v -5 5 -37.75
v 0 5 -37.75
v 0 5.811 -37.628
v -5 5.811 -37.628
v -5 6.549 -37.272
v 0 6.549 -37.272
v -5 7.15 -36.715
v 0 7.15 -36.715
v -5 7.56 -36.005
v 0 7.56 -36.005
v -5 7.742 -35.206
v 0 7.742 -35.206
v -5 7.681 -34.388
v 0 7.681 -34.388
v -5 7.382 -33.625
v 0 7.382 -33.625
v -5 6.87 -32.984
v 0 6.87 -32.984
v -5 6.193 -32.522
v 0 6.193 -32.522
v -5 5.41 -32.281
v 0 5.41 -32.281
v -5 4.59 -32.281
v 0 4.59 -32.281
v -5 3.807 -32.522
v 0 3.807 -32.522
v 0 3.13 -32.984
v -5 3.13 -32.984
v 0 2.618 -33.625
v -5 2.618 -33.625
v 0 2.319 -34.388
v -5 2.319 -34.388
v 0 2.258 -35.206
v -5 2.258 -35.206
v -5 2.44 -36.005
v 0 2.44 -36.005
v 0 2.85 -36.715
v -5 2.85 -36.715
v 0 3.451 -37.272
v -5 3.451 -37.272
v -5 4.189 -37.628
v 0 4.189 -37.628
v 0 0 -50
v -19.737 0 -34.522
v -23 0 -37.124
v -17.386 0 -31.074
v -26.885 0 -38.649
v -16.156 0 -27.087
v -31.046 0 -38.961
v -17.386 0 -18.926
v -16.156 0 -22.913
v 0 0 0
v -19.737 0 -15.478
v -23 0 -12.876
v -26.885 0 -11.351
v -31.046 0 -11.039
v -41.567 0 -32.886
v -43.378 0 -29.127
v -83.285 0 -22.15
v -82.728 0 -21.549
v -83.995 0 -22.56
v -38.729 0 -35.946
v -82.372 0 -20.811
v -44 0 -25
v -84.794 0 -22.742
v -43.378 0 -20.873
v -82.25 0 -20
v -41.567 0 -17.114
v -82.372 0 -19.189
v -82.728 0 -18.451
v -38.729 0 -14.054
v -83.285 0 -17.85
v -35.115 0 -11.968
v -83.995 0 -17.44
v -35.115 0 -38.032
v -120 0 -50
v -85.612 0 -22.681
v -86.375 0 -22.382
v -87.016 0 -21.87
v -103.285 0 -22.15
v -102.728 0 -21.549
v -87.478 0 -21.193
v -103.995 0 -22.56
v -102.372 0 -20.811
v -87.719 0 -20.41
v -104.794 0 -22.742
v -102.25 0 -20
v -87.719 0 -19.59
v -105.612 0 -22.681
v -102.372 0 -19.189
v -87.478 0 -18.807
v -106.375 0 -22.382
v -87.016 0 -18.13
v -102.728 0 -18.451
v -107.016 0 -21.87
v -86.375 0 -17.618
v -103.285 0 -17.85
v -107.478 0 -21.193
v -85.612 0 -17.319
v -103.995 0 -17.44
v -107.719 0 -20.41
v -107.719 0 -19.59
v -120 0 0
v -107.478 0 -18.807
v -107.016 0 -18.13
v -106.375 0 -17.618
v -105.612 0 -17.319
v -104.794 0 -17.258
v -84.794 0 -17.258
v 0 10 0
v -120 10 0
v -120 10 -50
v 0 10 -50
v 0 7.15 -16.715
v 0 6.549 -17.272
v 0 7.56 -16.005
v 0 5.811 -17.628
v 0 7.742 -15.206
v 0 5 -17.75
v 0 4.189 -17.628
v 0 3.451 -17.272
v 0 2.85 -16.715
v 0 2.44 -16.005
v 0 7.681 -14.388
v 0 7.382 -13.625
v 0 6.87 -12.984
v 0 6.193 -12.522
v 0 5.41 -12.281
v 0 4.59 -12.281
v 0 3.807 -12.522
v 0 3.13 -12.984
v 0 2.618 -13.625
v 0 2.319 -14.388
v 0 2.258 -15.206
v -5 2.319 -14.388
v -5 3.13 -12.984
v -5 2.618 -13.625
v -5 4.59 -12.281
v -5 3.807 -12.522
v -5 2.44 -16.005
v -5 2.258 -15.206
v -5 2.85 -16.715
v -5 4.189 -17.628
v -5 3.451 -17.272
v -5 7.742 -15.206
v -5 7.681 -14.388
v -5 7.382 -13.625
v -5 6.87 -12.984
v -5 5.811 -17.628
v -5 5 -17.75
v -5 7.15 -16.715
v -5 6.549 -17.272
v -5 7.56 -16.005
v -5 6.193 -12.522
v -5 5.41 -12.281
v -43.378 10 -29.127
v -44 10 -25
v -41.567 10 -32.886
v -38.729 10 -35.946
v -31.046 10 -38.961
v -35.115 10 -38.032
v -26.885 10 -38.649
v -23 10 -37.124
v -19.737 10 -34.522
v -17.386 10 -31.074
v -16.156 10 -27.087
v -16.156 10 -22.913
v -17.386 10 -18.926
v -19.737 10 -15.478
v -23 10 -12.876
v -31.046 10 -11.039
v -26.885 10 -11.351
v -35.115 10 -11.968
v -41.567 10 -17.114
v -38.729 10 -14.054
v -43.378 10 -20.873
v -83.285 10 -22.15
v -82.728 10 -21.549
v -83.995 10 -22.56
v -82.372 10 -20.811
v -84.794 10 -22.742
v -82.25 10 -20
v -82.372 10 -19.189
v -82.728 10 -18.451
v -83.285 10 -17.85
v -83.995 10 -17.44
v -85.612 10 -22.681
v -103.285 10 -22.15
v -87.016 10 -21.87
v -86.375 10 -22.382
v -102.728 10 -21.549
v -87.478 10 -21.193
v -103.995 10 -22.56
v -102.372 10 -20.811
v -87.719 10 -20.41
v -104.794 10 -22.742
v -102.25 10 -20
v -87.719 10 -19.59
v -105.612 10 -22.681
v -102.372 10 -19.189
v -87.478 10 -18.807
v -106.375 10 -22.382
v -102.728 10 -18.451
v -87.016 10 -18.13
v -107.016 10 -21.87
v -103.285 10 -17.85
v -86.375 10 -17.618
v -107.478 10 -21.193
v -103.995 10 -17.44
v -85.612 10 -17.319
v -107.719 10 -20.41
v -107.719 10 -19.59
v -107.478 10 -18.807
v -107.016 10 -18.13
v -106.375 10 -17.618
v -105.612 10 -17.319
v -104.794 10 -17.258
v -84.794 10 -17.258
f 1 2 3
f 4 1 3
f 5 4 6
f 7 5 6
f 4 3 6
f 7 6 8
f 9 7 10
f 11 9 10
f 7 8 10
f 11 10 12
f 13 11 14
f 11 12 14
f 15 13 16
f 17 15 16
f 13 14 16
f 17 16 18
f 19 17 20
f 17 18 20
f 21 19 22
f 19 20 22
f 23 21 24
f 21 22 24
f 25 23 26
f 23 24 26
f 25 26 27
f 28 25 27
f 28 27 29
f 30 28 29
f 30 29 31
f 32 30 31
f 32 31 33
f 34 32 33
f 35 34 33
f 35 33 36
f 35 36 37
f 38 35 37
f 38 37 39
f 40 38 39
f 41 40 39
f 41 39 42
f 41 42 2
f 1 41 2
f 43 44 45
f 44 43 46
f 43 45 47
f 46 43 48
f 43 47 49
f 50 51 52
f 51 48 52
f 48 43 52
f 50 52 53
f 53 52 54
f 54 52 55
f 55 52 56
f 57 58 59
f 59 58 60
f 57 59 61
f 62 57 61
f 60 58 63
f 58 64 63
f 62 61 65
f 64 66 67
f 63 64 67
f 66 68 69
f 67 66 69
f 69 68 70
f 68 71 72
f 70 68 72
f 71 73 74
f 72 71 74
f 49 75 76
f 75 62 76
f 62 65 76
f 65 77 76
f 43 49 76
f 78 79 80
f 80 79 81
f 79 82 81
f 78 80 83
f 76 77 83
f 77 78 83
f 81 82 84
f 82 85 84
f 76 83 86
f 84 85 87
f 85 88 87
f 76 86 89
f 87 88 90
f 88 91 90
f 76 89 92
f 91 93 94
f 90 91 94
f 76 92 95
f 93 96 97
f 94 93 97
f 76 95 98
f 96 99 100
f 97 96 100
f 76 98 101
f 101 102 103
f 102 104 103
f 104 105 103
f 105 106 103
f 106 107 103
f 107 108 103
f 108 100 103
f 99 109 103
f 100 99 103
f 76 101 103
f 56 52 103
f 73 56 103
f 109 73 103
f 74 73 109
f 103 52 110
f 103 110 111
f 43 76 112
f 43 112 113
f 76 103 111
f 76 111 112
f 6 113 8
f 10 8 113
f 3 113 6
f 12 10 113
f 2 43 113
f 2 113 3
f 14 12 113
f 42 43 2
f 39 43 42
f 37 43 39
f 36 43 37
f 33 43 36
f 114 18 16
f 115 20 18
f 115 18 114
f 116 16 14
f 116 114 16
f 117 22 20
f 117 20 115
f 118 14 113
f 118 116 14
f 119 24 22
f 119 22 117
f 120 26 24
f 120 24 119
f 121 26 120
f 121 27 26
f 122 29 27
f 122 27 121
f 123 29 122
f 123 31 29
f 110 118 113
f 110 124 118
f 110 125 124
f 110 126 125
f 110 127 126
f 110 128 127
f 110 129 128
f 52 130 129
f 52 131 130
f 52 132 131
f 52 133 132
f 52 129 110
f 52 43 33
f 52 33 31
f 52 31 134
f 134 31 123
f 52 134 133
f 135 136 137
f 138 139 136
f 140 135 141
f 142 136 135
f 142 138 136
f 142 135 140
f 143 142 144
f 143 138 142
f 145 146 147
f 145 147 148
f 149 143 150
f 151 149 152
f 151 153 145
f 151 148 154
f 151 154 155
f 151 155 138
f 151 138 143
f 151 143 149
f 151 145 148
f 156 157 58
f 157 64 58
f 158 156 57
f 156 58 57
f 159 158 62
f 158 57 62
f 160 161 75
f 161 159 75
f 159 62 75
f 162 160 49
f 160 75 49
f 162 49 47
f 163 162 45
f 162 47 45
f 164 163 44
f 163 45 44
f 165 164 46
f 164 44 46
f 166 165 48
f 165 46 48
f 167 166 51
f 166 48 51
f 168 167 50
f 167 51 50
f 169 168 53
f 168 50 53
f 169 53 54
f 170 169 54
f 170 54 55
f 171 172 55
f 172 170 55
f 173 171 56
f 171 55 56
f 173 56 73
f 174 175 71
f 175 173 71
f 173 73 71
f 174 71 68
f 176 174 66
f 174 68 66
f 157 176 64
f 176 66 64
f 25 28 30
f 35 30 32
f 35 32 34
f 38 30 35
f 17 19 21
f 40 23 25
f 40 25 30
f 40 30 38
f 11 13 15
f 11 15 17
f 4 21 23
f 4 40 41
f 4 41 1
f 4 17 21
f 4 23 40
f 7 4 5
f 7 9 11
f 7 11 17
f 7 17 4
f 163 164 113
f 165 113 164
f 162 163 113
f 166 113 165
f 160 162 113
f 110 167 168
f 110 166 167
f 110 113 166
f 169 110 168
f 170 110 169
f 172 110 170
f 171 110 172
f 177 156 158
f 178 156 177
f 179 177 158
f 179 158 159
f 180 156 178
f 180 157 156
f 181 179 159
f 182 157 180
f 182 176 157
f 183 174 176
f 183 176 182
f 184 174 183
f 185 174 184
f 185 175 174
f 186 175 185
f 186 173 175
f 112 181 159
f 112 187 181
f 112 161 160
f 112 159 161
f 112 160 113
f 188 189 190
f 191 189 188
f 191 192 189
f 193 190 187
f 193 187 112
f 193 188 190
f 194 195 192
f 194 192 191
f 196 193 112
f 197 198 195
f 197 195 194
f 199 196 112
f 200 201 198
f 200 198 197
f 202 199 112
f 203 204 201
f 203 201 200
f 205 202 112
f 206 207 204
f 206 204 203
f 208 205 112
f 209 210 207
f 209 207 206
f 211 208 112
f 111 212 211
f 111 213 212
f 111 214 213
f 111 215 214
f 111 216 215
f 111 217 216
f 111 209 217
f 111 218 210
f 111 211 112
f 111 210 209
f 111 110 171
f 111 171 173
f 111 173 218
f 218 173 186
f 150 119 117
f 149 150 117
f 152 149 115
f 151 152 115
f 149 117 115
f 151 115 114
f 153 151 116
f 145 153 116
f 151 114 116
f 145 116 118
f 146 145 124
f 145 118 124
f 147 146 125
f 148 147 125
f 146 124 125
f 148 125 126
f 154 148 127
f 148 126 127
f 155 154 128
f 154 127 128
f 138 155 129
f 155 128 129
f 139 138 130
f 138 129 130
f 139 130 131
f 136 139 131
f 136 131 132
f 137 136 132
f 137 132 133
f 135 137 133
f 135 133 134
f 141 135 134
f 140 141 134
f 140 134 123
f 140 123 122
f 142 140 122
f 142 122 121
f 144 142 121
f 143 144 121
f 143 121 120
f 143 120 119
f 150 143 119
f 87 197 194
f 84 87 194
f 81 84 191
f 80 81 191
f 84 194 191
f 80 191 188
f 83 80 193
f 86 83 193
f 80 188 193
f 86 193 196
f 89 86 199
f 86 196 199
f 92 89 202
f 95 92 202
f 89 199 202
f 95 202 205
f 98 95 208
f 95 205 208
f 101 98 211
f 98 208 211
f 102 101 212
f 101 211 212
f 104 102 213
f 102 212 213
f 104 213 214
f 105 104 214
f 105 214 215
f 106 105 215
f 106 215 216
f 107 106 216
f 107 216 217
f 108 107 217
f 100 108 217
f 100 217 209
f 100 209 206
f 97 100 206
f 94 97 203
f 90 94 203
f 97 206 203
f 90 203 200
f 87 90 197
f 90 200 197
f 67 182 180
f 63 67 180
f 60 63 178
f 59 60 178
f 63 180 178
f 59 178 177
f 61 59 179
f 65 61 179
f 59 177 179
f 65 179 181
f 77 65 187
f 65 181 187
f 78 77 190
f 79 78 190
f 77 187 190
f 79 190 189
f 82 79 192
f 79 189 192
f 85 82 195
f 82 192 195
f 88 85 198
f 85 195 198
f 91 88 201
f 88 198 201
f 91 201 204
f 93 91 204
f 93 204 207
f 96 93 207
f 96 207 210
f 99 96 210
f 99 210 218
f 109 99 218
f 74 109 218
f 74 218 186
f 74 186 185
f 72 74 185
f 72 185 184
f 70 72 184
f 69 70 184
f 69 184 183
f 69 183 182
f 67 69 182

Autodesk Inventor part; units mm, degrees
ref_plane "YZ Plane" through (0, 0, 0) normal (1, 0, 0) x (0, 1, 0)
ref_plane "XZ Plane" through (0, 0, 0) normal (0, 1, 0) x (-1, 0, 0)
ref_plane "XY Plane" through (0, 0, 0) normal (0, 0, 1) x (1, 0, 0)
sketch "Sketch1" plane through (0, 0, 0) normal (0, 1, 0) x (-1, 0, 0)
  line L0 (0, 0) -> (120, 0)
  line L1 (120, 0) -> (120, -50)
  line L2 (120, -50) -> (0, -50)
  line L3 (0, -50) -> (0, 0)
  circle A0 centre (30, -25) radius 14
  dimension "d0" = 120
  dimension "d1" = 50
  dimension "d4" = 28
  dimension "d5" = 30
extrude "Extrusion2" add sketch "Sketch1" along normal blind 10
sketch "Sketch2" plane through (0, 10, 0) normal (0, 1, 0) x (1, 0, 0)
  circle A0 centre (-105, 20) radius 2.75
  line L0 (-120, 50) -> (-120, 0) projected
  line L1 (0, 50) -> (-120, 50) projected
  circle A1 centre (-85, 20) radius 2.75
  line L2 (-120, 0) -> (0, 0) projected
  dimension "d8" = 5.5
  dimension "d9" = 50
  dimension "d11" = 15
  dimension "d14" = 20
  dimension "d21" = 20
extrude "Extrusion3" cut sketch "Sketch2" against normal blind 10
sketch "Sketch3" plane through (0, 0, 0) normal (1, 0, 0) x (0, 0, -1)
  circle A0 centre (15, 5) radius 2.75
  line L0 (0, 10) -> (50, 10) projected
  line L1 (0, 0) -> (0, 10) projected
  circle A1 centre (35, 5) radius 2.75
  dimension "d22" = 5.5
  dimension "d23" = 10
  dimension "d24" = 50
  dimension "d25" = 5
  dimension "d28" = 20
  dimension "d33" = 15
extrude "Extrusion4" cut sketch "Sketch3" against normal blind 5
equation "\"d25\" = 0.5 * d23"
equation "\"d33\" = -0.5 * d28 + 0.5 * d24"
properties part number "DriverElevatorConnection" material "Steel, Carbon"
